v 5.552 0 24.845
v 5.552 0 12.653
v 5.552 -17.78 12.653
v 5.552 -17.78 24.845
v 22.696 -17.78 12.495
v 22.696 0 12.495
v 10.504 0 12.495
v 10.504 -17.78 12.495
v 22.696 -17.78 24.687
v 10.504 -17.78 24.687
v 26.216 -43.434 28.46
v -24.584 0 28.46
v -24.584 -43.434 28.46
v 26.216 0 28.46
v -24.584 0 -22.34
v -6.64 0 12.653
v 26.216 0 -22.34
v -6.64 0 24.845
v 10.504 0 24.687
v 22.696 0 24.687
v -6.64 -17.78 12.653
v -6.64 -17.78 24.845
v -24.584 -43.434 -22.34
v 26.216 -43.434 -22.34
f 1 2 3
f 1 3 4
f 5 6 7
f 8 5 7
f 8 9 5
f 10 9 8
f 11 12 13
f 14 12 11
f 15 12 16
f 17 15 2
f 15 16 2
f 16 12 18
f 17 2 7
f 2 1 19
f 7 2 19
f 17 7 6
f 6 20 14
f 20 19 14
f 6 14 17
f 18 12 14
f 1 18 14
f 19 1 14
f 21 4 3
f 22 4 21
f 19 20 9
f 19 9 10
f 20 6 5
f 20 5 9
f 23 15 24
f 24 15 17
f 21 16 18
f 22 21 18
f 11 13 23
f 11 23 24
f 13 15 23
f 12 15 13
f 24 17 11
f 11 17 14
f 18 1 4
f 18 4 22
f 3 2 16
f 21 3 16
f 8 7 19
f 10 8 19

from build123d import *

# Parameters (mm, degrees)
F0_W     = 50.8
F0_H     = 50.8
F1_DEPTH = 43.434
F2_W     = 12.192
F2_H     = 12.192
F3_DEPTH = 17.78
F4_W     = 12.192
F4_H     = 12.192
F5_DEPTH = 17.78


with BuildPart() as f1:
    # F0 (on Front) → F1 (new body)
    with BuildSketch(Plane.XZ):
        with Locations((0.816428, 3.06024)):
            Rectangle(F0_W, F0_H)
    extrude(amount=F1_DEPTH)

    # F2 (on face) → F3 (cut)
    with BuildSketch(Plane(origin=(0, 0, 0), x_dir=(-1, 0, 0), z_dir=(0, 1, 0))):
        with Locations((-16.600084, 18.591136)):
            Rectangle(F2_W, F2_H)
    extrude(amount=-F3_DEPTH, mode=Mode.SUBTRACT)

    # F4 (on face) → F5 (cut)
    with BuildSketch(Plane(origin=(0, 0, 0), x_dir=(-1, 0, 0), z_dir=(0, 1, 0))):
        with Locations((0.544286, 18.74946)):
            Rectangle(F4_W, F4_H)
    extrude(amount=-F5_DEPTH, mode=Mode.SUBTRACT)


solid = f1.part
